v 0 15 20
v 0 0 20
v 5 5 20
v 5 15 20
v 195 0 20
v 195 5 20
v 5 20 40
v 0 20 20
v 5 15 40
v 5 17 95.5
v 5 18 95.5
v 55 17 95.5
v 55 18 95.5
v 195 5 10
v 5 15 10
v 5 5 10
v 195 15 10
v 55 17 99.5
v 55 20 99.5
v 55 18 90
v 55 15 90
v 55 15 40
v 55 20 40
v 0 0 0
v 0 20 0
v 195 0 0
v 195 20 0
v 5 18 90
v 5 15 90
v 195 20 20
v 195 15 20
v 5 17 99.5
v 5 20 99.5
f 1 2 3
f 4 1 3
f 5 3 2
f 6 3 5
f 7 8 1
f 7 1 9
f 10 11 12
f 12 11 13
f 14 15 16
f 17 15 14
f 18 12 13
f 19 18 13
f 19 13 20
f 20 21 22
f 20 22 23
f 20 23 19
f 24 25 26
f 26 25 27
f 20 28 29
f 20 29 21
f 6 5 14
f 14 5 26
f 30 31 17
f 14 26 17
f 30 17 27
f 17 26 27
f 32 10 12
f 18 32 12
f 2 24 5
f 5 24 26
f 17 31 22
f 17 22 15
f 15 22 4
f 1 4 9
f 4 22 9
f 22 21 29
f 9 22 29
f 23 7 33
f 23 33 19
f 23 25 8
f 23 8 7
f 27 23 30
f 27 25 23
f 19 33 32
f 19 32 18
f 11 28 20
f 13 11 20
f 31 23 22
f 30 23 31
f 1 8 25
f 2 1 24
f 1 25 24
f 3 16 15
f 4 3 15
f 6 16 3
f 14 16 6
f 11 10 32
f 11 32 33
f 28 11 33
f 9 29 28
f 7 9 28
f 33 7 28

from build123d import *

# Parameters (mm, degrees)
F0_W      = 190
F0_H      = 5
F1_DEPTH  = 20
F2_W      = 190
F2_H      = 10
F3_DEPTH  = 10
F4_W      = 50
F4_H      = 5
F5_DEPTH  = 70
F7_DEPTH  = 5
F8_W      = 50
F8_H      = 2
F9_DEPTH  = 5.5
F10_W     = 50
F10_H     = 3
F11_DEPTH = 4


with BuildPart() as f1:
    # F0 (on Top) → F1 (new body)
    with BuildSketch(Plane.XY):
        Polygon((0, 20), (0, 0), (5, 0), (5, 5), (5, 15), (5, 20), align=None)
        with Locations((100, 2.5)):
            Rectangle(F0_W, F0_H)
        with Locations((100, 17.5)):
            Rectangle(F0_W, F0_H)
    extrude(amount=F1_DEPTH)

    # F2 (on Top) → F3 (join)
    with BuildSketch(Plane.XY):
        with Locations((100, 10)):
            Rectangle(F2_W, F2_H)
    extrude(amount=F3_DEPTH)

    # F4 (on face) → F5 (join)
    with BuildSketch(Plane.XY.offset(20)):
        with Locations((30, 17.5)):
            Rectangle(F4_W, F4_H)
    extrude(amount=F5_DEPTH)

    # F6 (on face) → F7 (join)
    with BuildSketch(Plane(origin=(0, 20, 0), x_dir=(-1, 0, 0), z_dir=(0, 1, 0))):
        Polygon((-5, 20), (0, 20), (-5, 40), align=None)
        Polygon((-195, 20), (-55, 20), (-55, 40), align=None)
    extrude(amount=-F7_DEPTH)

    # F8 (on face) → F9 (join)
    with BuildSketch(Plane.XY.offset(90)):
        with Locations((30, 19)):
            Rectangle(F8_W, F8_H)
    extrude(amount=F9_DEPTH)

    # F10 (on face) → F11 (join)
    with BuildSketch(Plane.XY.offset(95.5)):
        with Locations((30, 18.5)):
            Rectangle(F10_W, F10_H)
    extrude(amount=F11_DEPTH)


solid = f1.part
